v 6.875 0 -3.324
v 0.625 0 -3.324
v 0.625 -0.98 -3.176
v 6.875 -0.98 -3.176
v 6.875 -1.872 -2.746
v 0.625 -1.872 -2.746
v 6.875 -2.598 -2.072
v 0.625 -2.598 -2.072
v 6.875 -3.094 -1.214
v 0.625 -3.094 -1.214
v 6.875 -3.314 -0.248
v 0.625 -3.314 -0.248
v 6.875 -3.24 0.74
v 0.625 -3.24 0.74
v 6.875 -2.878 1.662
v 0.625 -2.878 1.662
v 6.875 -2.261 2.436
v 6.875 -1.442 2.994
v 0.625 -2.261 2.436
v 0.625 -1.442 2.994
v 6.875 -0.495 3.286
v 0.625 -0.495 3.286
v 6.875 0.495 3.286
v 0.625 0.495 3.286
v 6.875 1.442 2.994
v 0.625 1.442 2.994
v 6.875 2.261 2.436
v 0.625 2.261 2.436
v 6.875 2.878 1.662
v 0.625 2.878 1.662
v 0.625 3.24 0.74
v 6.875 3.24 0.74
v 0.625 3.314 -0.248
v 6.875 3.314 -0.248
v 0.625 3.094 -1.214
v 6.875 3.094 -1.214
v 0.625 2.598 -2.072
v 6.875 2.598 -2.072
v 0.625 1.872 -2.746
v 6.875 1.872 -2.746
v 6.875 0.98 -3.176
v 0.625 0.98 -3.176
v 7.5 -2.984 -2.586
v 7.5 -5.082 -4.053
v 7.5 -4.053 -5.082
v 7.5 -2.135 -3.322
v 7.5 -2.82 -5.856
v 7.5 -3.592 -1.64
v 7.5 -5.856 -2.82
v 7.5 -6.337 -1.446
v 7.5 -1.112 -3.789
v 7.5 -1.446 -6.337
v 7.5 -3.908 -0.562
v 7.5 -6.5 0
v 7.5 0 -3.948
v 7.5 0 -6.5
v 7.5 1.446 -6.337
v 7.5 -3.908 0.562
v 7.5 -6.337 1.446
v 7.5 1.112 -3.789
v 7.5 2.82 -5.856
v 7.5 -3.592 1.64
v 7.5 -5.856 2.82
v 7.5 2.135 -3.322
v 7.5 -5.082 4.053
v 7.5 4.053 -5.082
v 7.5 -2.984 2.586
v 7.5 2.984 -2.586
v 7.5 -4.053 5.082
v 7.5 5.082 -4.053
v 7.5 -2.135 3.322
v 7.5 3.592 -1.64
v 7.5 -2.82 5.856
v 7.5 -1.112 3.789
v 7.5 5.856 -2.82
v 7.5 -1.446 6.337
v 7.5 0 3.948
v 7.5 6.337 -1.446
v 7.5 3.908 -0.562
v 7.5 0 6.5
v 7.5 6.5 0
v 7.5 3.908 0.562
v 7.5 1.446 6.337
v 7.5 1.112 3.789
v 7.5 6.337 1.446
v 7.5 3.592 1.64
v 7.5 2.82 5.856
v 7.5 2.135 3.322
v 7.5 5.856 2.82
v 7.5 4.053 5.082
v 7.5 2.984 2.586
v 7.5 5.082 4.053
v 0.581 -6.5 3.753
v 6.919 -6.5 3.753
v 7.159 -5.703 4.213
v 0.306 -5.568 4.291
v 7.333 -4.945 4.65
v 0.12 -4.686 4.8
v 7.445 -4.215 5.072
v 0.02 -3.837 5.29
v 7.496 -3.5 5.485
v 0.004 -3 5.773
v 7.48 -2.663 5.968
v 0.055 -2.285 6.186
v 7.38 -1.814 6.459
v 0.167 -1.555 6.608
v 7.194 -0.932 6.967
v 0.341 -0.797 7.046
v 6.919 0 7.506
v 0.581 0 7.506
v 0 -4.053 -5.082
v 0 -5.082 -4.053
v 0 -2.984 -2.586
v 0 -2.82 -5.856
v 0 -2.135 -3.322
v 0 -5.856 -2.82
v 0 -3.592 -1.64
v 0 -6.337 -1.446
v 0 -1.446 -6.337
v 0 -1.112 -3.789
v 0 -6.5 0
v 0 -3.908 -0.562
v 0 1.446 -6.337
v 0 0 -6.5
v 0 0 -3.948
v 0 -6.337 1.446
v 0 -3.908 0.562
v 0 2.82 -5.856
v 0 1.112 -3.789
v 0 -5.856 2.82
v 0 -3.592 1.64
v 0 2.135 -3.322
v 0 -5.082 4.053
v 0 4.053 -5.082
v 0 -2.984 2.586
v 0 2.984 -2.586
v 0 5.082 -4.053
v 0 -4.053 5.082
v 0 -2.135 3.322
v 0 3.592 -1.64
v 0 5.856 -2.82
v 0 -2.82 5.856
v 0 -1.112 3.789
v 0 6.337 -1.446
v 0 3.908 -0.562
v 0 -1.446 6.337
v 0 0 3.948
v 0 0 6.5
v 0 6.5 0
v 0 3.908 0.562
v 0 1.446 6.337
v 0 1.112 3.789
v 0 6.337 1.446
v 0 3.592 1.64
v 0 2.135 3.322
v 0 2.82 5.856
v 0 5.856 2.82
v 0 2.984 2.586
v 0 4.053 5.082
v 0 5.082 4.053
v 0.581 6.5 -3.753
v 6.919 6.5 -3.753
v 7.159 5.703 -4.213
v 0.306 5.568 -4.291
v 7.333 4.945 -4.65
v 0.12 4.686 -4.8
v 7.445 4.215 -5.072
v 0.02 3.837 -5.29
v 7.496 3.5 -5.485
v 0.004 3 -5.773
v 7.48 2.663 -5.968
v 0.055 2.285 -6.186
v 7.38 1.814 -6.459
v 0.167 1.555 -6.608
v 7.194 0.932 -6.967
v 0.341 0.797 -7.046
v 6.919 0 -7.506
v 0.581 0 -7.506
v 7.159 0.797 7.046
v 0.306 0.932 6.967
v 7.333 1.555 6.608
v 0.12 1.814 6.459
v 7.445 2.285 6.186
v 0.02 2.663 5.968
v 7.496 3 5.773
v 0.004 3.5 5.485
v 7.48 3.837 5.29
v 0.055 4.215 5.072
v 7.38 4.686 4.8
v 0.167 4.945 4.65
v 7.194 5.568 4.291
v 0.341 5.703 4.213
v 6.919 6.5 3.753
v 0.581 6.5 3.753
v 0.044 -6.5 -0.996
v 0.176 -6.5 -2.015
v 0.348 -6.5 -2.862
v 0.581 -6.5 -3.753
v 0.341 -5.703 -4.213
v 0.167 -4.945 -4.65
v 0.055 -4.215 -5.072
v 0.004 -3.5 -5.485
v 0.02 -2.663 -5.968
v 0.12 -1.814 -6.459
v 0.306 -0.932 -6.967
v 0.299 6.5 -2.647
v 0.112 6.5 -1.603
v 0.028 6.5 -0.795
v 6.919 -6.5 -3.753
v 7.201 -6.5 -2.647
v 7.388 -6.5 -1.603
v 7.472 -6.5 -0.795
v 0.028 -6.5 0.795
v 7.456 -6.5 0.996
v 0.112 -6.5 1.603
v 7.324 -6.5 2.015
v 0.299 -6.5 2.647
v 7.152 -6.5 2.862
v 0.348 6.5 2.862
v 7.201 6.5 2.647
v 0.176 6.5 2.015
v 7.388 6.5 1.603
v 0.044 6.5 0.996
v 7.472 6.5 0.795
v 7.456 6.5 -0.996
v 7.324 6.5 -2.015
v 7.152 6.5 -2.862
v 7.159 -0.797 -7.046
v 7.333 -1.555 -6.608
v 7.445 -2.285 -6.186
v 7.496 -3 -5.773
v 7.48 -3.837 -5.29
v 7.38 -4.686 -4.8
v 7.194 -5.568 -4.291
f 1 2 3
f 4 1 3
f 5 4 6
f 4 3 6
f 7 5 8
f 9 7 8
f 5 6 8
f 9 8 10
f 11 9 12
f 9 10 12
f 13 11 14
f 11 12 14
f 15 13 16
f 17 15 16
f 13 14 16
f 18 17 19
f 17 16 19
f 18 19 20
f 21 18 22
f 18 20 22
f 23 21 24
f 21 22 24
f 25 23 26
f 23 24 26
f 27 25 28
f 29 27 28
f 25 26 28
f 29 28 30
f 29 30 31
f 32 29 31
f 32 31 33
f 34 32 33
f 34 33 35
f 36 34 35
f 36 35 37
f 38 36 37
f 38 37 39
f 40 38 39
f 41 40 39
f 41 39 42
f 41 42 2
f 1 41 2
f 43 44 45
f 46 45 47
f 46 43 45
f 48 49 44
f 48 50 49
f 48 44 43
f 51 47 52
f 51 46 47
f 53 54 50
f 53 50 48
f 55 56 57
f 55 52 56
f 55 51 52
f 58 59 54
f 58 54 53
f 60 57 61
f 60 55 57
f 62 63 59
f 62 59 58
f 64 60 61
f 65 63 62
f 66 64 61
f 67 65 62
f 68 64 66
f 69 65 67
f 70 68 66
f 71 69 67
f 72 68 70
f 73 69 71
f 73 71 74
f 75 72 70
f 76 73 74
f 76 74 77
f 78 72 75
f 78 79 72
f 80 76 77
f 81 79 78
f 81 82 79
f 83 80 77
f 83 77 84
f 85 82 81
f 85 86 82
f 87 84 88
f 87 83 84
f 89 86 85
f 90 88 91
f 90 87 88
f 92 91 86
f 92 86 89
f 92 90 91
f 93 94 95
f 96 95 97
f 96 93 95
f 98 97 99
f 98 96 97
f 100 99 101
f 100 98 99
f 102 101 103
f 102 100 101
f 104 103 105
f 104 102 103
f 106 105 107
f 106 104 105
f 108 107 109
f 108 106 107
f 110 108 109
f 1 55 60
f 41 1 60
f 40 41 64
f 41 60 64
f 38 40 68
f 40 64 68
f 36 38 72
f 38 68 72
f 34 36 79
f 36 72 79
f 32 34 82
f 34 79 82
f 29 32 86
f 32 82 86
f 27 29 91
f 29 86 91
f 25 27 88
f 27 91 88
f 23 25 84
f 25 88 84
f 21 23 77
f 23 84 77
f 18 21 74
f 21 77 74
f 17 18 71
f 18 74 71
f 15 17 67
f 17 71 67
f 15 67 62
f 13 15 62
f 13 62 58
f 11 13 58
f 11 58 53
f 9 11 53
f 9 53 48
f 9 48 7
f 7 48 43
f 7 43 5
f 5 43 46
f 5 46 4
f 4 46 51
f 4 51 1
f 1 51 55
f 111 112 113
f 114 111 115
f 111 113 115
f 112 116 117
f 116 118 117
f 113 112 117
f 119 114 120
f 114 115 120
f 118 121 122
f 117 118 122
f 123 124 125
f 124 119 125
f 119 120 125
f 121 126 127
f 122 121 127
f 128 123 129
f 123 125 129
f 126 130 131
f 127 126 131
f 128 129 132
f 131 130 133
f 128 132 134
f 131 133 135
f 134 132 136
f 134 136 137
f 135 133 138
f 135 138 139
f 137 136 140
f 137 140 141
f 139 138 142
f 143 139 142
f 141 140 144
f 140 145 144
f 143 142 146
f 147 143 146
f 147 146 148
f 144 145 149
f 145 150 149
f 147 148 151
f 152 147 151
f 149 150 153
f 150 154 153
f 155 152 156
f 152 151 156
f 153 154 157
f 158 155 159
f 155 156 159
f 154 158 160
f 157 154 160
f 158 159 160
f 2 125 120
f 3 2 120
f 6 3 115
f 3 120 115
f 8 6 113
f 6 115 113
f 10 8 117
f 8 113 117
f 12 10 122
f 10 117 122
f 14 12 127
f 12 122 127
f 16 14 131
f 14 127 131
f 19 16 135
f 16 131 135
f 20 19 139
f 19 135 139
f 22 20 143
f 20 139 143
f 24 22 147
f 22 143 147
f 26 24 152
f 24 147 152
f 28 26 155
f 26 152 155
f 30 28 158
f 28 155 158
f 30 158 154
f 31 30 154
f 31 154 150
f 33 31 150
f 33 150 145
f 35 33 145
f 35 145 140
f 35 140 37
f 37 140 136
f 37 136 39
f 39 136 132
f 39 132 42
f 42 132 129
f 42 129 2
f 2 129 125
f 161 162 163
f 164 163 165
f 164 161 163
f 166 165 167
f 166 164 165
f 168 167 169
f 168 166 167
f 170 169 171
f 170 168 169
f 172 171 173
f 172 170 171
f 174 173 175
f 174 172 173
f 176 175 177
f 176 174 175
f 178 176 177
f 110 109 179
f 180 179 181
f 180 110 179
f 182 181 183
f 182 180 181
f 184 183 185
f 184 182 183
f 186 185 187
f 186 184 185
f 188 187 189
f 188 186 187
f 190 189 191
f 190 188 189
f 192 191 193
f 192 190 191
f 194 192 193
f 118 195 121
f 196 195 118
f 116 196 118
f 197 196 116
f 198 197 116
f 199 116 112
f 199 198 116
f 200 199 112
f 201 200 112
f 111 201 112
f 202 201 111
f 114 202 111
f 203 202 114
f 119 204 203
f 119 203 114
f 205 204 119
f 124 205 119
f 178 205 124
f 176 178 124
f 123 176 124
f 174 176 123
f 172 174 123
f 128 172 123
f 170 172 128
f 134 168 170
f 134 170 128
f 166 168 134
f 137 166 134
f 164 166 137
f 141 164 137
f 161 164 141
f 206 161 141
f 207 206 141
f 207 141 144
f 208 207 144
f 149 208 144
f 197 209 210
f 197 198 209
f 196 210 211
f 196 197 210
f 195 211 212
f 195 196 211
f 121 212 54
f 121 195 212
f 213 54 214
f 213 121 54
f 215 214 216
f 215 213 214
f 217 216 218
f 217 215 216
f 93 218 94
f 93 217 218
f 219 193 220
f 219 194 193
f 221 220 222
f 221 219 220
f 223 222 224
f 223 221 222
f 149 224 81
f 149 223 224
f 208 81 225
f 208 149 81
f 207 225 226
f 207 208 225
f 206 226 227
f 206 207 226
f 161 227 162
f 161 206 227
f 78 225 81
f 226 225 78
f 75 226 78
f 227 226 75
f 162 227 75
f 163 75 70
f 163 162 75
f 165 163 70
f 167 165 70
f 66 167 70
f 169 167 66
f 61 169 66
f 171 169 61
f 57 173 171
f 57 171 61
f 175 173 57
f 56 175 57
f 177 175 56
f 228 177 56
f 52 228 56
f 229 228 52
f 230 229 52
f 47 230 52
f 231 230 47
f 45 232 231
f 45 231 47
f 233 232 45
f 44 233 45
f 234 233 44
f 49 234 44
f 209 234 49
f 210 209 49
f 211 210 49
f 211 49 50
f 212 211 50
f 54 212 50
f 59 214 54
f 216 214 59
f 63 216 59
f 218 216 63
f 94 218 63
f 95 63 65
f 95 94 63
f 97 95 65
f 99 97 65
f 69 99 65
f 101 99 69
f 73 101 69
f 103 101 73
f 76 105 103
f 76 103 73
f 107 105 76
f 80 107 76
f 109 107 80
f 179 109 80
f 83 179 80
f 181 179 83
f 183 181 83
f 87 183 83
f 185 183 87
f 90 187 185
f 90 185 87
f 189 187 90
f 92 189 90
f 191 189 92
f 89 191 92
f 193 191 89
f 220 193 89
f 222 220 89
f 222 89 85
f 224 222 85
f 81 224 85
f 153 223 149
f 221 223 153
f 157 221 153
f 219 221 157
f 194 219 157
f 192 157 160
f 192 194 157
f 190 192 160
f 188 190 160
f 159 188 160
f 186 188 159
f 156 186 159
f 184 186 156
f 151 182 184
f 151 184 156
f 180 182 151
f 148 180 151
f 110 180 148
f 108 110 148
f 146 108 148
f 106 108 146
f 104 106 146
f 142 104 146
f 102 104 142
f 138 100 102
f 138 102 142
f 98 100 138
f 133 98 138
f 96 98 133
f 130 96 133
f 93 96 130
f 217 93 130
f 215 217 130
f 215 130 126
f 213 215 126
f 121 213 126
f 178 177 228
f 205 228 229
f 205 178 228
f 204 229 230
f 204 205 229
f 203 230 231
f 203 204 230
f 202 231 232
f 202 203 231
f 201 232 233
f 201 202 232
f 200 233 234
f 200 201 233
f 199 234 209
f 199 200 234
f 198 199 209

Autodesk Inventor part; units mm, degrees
sketch "Sketch1" plane through (0, 0, 0) normal (1, 0, 0) x (0, 1, 0)
  line L0 (6.5, 3.7528) -> (6.5, -3.7528)
  line L1 (6.5, -3.7528) -> (0, -7.5056)
  line L2 (0, -7.5056) -> (-6.5, -3.7528)
  line L3 (-6.5, -3.7528) -> (-6.5, 3.7528)
  line L4 (-6.5, 3.7528) -> (0, 7.5056)
  line L5 (0, 7.5056) -> (6.5, 3.7528)
  circle A0 centre (0, 0) radius 6.5 construction
  dimension "d0" = 13
extrude "Extrusion1" add sketch "Sketch1" along normal blind 7.5
sketch "Sketch2" plane through (7.5, 0, 0) normal (1, 0, 0) x (0, 1, 0)
  line L0 (-6.5, 3.7528) -> (0, 7.5056) projected
  line L1 (0, -7.5056) -> (-6.5, -3.7528) projected
  line L2 (-6.5, 3.7528) -> (6.5, -3.7528) construction
  line L3 (-6.5, -3.7528) -> (6.5, 3.7528) construction
  point P0 (0, 0)
hole "Hole1" at (7.5, 0, 0) direction (-1, 0, 0) diameter 6.647 end through all thread size "M8x1.25" class "6H" standard "ISO Metric profile"
chamfer "Chamfer1" distance 0.625 angle 45 2 edges at (7.5, 0, 3.3235) (0, 0, 3.3235)
sketch "Sketch3" plane through (0, 0, 0) normal (0, 1, 0) x (-1, 0, 0)
  line L0 (-9.1715, 0) -> (2.5289, 0) projected
  line L1 (-5.7048, 0) -> (0.8574, 0)
  line L2 (-7.5, 0) -> (-7.5, -7.5056)
  line L3 (-7.5, -7.5056) -> (0, -7.5056)
  line L4 (0, -7.5056) -> (0, 0)
  line L5 (-7.5, -3.7528) -> (-7.5, -7.5056) projected
  line L6 (0, -3.7528) -> (0, -7.5056) projected
  line L7 (0, -7.5056) -> (-7.5, -7.5056) projected
  line L8 (-7.5, -6.5) -> (-6.9194, -7.5056)
  line L9 (-7.5, -7.5056) -> (-7.5, -6.5)
  line L10 (-7.5, -7.5056) -> (-6.9194, -7.5056)
  line L11 (0, -6.5) -> (-0.5806, -7.5056)
  line L12 (-0.5806, -7.5056) -> (0, -7.5056)
  line L13 (0, -7.5056) -> (0, -6.5)
  dimension "d32" = 6.5
  dimension "d33" = 30
revolve "Revolution1" cut sketch "Sketch3" angle 360 about axis through (0, 0, 0) along (-1, 0, 0) contours L8 L3 L2 | L4 L3 L11
ref_plane "MSC_PT1" through (7.5, 0, 0) normal (1, 0, 0) x (0, 1, 0)
ref_plane "MSC_PT2" through (0, 0, 0) normal (-1, 0, 0) x (0, -1, 0)
ref_plane "MSC_PF1" through (0, 0, 0) normal (1, 0, 0) x (0, 1, 0)
equation "\"d0\" = Smax"
equation "\"d1\" = Mmax"
equation "\"d10\" = 0.5 * PTC"
equation "\"d32\" = 0.5 * Smax"
equation "\"NND\" = 8"
equation "\"Smax\" = 13"
equation "\"Mmax\" = 7.5"
equation "\"PTC\" = 1.25"
equation "\"THREADDIA\" = NND"
equation "\"TEMPLATE\" = 1.2345"
properties part number "ANSI B18.2.4.2M - M8x1.25" material "Steel, Mild"
